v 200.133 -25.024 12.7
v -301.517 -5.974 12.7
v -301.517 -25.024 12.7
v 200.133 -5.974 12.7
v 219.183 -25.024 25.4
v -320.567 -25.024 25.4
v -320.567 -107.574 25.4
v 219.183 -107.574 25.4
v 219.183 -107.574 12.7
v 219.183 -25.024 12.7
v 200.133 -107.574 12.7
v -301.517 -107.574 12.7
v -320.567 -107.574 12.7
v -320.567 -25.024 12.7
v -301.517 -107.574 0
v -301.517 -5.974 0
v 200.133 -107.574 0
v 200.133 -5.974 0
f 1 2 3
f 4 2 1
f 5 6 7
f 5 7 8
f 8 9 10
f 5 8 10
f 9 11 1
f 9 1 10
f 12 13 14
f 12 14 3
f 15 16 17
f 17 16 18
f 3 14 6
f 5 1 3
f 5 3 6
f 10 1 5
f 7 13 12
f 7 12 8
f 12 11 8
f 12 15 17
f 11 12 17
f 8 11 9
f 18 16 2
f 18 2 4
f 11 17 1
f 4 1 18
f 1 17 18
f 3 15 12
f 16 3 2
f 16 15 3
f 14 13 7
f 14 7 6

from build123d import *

# Parameters (mm, degrees)
F0_W     = 501.65
F0_H     = 82.55
F0_W_2   = 19.05
F0_H_2   = 19.05
F1_DEPTH = 12.7
F2_DEPTH = 25.4
F3_DEPTH = 12.7


with BuildPart() as f1:
    # F0 (on Top) → F1 (new body)
    with BuildSketch(Plane.XY):
        with Locations((-50.692200847, -66.2992455751)):
            Rectangle(F0_W, F0_H)
        with Locations((-311.042200847, -66.2992455751)):
            Rectangle(F0_W_2, F0_H)
        with Locations((-50.692200847, -15.4992455751)):
            Rectangle(F0_W, F0_H_2)
        with Locations((209.657799153, -66.2992455751)):
            Rectangle(F0_W_2, F0_H)
    extrude(amount=F1_DEPTH)

    # F0 (on Top) → F2 (join)
    with BuildSketch(Plane.XY):
        with Locations((-50.692200847, -66.2992455751)):
            Rectangle(F0_W, F0_H)
        with Locations((-311.042200847, -66.2992455751)):
            Rectangle(F0_W_2, F0_H)
        with Locations((209.657799153, -66.2992455751)):
            Rectangle(F0_W_2, F0_H)
    extrude(amount=F2_DEPTH)

    # F0 (on Top) → F3 (cut)
    with BuildSketch(Plane.XY):
        with Locations((-311.042200847, -66.2992455751)):
            Rectangle(F0_W_2, F0_H)
        with Locations((209.657799153, -66.2992455751)):
            Rectangle(F0_W_2, F0_H)
    extrude(amount=F3_DEPTH, mode=Mode.SUBTRACT)


solid = f1.part
